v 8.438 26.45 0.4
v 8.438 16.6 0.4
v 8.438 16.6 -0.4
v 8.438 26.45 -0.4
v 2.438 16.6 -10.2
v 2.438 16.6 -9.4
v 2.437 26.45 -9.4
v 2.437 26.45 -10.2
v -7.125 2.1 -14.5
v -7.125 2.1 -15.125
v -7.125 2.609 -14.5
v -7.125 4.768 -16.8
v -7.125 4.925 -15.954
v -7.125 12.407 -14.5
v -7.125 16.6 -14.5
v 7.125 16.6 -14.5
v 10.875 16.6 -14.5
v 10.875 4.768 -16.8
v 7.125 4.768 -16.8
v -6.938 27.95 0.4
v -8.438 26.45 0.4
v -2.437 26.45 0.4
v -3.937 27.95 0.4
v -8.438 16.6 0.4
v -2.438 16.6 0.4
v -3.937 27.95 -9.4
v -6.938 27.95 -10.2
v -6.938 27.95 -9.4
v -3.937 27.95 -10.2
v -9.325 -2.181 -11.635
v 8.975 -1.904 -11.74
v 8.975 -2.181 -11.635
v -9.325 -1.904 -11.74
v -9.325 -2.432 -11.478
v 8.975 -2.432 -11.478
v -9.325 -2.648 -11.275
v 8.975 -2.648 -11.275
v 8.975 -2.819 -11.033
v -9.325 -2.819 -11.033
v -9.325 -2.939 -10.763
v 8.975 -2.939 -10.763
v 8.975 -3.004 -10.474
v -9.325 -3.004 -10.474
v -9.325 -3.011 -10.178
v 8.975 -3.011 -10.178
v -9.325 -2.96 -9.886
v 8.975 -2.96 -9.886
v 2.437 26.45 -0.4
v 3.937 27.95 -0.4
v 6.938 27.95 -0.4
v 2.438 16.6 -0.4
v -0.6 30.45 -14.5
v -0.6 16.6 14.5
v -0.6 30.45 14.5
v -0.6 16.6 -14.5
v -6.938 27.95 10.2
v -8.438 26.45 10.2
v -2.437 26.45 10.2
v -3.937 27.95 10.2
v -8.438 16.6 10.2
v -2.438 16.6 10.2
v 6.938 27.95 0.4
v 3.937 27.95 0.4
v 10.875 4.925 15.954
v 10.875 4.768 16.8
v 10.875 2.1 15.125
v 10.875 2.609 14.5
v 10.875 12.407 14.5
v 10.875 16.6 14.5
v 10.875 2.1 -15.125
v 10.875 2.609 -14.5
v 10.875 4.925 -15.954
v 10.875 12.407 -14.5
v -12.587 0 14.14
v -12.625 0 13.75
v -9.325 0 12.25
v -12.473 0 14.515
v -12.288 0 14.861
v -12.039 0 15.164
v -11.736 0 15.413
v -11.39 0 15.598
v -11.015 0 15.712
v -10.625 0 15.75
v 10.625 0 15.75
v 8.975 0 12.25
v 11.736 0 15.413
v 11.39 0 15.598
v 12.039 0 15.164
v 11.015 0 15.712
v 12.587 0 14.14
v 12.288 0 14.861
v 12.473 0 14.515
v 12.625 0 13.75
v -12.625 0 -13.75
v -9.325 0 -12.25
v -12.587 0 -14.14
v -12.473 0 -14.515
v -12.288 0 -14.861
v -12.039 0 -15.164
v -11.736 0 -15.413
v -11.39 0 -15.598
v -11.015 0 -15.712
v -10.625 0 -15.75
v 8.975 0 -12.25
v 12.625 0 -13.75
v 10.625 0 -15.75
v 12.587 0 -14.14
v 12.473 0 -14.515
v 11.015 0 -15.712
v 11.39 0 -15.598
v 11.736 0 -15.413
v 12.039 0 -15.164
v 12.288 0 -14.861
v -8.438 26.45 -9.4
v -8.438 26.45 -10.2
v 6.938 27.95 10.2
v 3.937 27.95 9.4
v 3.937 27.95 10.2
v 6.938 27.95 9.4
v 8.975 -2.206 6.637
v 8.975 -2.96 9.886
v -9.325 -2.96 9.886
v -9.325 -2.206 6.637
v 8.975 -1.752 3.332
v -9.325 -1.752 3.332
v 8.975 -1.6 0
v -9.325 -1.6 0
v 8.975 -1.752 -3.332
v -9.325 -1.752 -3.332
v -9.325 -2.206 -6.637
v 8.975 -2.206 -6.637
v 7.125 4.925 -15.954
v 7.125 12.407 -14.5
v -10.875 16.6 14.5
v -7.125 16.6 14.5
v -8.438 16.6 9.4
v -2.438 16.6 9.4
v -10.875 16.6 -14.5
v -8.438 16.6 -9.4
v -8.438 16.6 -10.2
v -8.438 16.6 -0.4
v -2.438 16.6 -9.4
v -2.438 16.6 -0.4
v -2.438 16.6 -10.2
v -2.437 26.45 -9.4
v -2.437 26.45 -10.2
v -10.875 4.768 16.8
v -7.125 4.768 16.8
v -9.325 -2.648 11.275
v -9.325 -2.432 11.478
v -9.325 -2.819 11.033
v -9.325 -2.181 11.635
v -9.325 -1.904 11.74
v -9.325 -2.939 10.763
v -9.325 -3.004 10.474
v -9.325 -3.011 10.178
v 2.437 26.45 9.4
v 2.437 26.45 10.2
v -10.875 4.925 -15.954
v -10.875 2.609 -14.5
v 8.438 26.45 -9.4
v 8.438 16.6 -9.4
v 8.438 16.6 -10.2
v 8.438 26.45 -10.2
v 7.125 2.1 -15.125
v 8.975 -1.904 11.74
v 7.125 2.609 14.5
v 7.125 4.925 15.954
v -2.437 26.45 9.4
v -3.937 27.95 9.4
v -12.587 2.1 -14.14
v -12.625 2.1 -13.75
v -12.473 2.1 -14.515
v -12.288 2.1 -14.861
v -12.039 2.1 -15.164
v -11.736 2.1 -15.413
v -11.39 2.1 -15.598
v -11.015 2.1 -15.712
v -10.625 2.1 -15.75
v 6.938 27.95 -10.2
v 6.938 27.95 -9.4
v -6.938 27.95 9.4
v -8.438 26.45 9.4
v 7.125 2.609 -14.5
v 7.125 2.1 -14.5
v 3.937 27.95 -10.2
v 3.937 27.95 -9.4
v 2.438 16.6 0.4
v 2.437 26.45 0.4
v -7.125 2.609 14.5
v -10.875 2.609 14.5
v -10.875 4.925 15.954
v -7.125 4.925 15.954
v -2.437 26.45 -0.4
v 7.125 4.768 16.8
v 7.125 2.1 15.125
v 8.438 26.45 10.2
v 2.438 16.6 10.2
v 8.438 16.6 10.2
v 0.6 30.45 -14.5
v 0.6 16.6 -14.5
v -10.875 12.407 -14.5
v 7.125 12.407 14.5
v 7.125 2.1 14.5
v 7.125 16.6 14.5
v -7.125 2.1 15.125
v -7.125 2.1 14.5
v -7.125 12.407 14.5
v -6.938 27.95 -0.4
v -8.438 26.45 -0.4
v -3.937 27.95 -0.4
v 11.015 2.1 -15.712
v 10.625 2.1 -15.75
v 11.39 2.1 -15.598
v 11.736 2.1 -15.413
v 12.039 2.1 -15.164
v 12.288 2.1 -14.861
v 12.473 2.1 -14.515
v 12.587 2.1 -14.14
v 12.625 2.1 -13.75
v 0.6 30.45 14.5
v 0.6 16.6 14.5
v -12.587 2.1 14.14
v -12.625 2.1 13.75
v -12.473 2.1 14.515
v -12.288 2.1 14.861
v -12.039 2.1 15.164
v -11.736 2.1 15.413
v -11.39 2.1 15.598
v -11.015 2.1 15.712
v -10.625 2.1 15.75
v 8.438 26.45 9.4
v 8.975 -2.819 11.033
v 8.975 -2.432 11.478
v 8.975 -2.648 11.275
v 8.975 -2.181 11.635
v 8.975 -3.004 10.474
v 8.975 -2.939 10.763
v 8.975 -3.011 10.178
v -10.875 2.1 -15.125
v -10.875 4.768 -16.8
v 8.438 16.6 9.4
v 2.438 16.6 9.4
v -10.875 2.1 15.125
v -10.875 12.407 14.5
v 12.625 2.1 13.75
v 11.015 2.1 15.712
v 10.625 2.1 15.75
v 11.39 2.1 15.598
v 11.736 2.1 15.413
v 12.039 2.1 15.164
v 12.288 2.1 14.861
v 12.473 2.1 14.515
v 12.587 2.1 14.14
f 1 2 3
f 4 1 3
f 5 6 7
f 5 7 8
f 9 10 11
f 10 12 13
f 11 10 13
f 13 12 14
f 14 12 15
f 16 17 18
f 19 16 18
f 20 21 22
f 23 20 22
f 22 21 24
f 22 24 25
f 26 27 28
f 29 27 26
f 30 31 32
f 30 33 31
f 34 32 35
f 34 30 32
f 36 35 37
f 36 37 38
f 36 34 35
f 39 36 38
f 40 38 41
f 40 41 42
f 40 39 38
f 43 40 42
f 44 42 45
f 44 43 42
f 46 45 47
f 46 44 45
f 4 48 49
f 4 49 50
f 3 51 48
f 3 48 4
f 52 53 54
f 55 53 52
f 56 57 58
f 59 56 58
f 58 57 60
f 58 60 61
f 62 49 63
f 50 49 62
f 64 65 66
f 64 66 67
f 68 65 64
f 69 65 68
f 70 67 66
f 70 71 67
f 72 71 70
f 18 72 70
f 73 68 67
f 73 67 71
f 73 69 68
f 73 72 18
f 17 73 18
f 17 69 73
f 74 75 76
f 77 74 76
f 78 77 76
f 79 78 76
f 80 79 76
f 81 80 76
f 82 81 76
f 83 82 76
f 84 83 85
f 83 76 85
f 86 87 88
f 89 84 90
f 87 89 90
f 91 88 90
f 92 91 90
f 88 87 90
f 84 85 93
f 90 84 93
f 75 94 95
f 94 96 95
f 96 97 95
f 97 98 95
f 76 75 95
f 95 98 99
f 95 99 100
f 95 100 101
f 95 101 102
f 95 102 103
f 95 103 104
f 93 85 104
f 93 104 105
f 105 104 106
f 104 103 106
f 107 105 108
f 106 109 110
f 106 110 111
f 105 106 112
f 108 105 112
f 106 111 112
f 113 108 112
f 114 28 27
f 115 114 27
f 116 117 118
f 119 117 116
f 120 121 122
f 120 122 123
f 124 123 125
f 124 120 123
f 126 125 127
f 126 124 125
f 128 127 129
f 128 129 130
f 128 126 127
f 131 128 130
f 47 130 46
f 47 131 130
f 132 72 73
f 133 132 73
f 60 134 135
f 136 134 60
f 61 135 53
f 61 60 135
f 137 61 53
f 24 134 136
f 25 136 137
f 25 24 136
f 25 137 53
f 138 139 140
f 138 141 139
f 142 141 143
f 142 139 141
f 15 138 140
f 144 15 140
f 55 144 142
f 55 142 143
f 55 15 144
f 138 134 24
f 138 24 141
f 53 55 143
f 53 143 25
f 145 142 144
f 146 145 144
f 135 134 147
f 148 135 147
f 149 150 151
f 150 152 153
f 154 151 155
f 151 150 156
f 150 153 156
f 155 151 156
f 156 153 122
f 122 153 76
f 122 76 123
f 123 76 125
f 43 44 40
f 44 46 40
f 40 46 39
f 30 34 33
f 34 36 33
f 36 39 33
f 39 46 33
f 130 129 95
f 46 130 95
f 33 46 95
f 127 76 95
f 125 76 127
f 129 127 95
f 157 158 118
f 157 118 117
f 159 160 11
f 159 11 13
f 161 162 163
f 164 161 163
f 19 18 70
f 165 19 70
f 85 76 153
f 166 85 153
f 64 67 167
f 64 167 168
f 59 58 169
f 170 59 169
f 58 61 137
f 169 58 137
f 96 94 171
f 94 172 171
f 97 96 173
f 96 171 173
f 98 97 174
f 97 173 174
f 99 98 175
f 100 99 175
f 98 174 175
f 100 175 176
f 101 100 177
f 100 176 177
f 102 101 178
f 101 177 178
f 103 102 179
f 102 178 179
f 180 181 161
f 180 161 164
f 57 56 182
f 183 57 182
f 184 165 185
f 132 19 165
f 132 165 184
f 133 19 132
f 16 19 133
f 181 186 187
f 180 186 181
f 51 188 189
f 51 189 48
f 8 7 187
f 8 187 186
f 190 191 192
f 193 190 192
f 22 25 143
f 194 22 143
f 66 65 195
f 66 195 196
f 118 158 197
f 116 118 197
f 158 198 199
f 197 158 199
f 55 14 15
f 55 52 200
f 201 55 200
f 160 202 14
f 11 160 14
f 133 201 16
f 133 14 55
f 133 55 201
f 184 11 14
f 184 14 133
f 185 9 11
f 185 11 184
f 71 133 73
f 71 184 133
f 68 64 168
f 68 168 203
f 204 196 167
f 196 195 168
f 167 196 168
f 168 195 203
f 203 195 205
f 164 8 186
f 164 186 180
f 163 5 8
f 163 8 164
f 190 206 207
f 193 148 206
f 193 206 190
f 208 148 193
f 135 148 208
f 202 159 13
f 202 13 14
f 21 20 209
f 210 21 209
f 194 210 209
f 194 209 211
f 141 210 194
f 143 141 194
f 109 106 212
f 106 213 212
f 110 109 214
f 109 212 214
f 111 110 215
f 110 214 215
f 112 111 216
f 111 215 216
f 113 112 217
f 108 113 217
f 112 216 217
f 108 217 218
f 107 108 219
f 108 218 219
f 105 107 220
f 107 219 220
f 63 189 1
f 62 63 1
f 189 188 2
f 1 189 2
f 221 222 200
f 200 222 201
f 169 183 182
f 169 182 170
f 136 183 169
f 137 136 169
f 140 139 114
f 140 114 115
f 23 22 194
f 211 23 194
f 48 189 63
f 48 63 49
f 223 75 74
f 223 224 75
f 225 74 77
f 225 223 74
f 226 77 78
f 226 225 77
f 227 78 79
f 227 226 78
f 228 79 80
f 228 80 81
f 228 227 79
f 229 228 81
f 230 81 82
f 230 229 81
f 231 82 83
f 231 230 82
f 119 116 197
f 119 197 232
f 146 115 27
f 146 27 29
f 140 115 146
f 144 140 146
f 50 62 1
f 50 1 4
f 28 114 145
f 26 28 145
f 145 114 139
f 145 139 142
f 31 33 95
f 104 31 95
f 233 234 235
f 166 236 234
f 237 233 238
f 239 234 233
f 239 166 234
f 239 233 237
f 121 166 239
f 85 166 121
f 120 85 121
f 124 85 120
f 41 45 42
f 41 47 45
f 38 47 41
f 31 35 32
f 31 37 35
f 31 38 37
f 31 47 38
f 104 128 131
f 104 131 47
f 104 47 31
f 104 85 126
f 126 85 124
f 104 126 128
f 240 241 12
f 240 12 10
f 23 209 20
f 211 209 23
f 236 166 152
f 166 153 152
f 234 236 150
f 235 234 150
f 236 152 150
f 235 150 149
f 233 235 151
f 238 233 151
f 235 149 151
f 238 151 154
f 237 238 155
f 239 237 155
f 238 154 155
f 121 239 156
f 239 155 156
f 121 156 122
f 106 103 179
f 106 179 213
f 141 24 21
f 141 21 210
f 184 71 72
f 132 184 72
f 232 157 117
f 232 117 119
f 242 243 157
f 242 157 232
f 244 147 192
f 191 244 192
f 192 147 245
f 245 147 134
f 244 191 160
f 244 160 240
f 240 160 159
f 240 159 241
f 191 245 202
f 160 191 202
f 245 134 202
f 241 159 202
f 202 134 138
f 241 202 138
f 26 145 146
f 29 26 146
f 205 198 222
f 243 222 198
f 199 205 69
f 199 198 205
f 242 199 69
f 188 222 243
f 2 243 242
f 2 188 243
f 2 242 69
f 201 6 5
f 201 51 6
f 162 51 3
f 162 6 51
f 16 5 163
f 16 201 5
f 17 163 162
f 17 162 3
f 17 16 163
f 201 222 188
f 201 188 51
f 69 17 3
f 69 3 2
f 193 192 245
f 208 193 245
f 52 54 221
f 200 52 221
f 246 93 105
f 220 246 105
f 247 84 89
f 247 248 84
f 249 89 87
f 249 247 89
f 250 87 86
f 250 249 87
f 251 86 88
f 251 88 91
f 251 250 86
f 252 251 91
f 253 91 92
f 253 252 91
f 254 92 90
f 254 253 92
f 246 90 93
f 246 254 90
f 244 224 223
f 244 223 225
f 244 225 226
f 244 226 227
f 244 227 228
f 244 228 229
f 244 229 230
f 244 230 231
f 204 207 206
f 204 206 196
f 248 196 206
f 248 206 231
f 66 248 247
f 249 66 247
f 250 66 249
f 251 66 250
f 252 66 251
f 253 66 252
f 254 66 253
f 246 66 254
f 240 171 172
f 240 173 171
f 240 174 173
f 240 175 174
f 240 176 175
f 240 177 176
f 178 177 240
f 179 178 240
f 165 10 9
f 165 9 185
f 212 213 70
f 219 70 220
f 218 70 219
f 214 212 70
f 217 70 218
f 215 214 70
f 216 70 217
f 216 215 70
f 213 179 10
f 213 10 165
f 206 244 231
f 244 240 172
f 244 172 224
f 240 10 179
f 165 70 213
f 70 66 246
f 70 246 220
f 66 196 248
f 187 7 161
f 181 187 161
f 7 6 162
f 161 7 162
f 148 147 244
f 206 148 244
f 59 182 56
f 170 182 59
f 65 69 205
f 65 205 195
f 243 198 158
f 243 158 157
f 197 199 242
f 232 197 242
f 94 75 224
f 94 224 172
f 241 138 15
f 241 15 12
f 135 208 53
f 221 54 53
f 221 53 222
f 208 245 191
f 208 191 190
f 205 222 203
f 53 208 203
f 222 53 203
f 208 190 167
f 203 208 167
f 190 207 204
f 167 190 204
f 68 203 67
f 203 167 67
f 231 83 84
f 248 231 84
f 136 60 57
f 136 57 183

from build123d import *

# Parameters (mm, degrees)
SKETCH1_W            = 21.75
SKETCH1_H            = 29
BOSS_EXTRUDE1_DEPTH  = 16.6
SKETCH2_W            = 25.25
SKETCH2_H            = 31.5
BOSS_EXTRUDE2_DEPTH  = 2.1
SKETCH3_W            = 1.2
SKETCH3_H            = 29
BOSS_EXTRUDE3_DEPTH  = 13.85
BOSS_EXTRUDE4_START  = -3.65
BOSS_EXTRUDE4_DEPTH  = 18.3
SKETCH5_W            = 6
SKETCH5_H            = 0.8
BOSS_EXTRUDE6_DEPTH  = 11.35
CHAMFER2_SIZE        = 1.5
FILLET1_R            = 2
FILLET2_R            = 1.5
BOSS_EXTRUDE7_DEPTH  = 3.75
MIRROR2_COPY_1_DEPTH = 3.75


with BuildPart() as part:
    # Sketch1 → Boss-Extrude1 (new body)
    with BuildSketch(Plane(origin=(0, 0, 0), x_dir=(1, 0, 0), z_dir=(0, 1, 0))):
        Rectangle(SKETCH1_W, SKETCH1_H)
    extrude(amount=BOSS_EXTRUDE1_DEPTH)

    # Sketch2 → Boss-Extrude2 (add)
    with BuildSketch(Plane(origin=(0, 0, 0), x_dir=(1, 0, 0), z_dir=(0, 1, 0))):
        Rectangle(SKETCH2_W, SKETCH2_H)
    extrude(amount=BOSS_EXTRUDE2_DEPTH)

    # Sketch3 → Boss-Extrude3 (add)
    with BuildSketch(Plane(origin=(0, 16.6, 0), x_dir=(1, 0, 0), z_dir=(0, 1, 0))):
        Rectangle(SKETCH3_W, SKETCH3_H)
    extrude(amount=BOSS_EXTRUDE3_DEPTH)

    # Sketch4 → Boss-Extrude4 (add)
    with BuildSketch(Plane(origin=(12.625, 0, 0), x_dir=(0, 0, -1), z_dir=(1, 0, 0)).offset(BOSS_EXTRUDE4_START)):
        with BuildLine():
            Line((-12.25, 0), (-11.338972746, -3.4))
            ThreePointArc((-11.338972746, -3.4), (0, -1.6), (11.338972746, -3.4))
            Line((11.338972746, -3.4), (12.25, 0))
            Line((12.25, 0), (-12.25, 0))
        make_face()
    extrude(amount=-BOSS_EXTRUDE4_DEPTH)

    # Sketch5 → Boss-Extrude6 (add)
    with BuildSketch(Plane(origin=(0, 16.6, 0), x_dir=(1, 0, 0), z_dir=(0, 1, 0))):
        with Locations((5.4375, 9.8)):
            Rectangle(SKETCH5_W, SKETCH5_H)
        with Locations((5.4375, 0)):
            Rectangle(SKETCH5_W, SKETCH5_H)
        with Locations((5.4375, -9.8)):
            Rectangle(SKETCH5_W, SKETCH5_H)
        with Locations((-5.4375, -9.8)):
            Rectangle(SKETCH5_W, SKETCH5_H)
        with Locations((-5.4375, 0)):
            Rectangle(SKETCH5_W, SKETCH5_H)
        with Locations((-5.4375, 9.8)):
            Rectangle(SKETCH5_W, SKETCH5_H)
    extrude(amount=BOSS_EXTRUDE6_DEPTH)

    # Chamfer2
    chamfer2_edges = [part.edges().sort_by_distance(p)[0] for p in [
        (-2.4375, 27.95, 0),
        (-8.4375, 27.95, 0),
        (-2.4375, 27.95, -9.8),
        (-8.4375, 27.95, -9.8),
        (8.4375, 27.95, 0),
        (2.4375, 27.95, 0),
        (-2.4375, 27.95, 9.8),
        (-8.4375, 27.95, 9.8),
        (2.4375, 27.95, -9.8),
        (8.4375, 27.95, -9.8),
        (2.4375, 27.95, 9.8),
        (8.4375, 27.95, 9.8),
    ]]
    chamfer(chamfer2_edges, length=CHAMFER2_SIZE)

    # Fillet1
    fillet1_edges = [part.edges().sort_by_distance(p)[0] for p in [
        (12.625, 1.05, 15.75),
        (12.625, 1.05, -15.75),
        (-12.625, 1.05, -15.75),
        (-12.625, 1.05, 15.75),
    ]]
    fillet(fillet1_edges, radius=FILLET1_R)

    # Fillet2
    fillet2_edges = [part.edges().sort_by_distance(p)[0] for p in [
        (-0.175, -3.4, -11.338972746),
        (-0.175, -3.4, 11.338972746),
    ]]
    fillet(fillet2_edges, radius=FILLET2_R)

    # Sketch6 → Boss-Extrude7 (add)
    with BuildSketch(Plane.ZY.offset(10.875)):
        Polygon((-14.5, 16.6), (-16.8, 4.767525763), (-15.125, 2.1), (-14.5, 2.1), (-14.5, 2.609042619), (-15.954375498, 4.925212238), (-14.5, 12.407325549), align=None)
    boss_extrude7 = extrude(amount=-BOSS_EXTRUDE7_DEPTH)

    # Mirror1: Boss-Extrude7 across plane
    add(boss_extrude7.mirror(Plane(origin=(0, 0, 0), x_dir=(0, 0, 1), z_dir=(1, 0, 0))))

    # Mirror2: Boss-Extrude7 across plane
    add(boss_extrude7.mirror(Plane.XY))

    # Mirror2 copy 1 sketch → Mirror2 copy 1 (add)
    with BuildSketch(Plane(origin=(10.875, 0, 0), x_dir=(0, 0, -1), z_dir=(1, 0, 0))):
        Polygon((-14.5, 16.6), (-16.8, 4.767525763), (-15.125, 2.1), (-14.5, 2.1), (-14.5, 2.609042619), (-15.954375498, 4.925212238), (-14.5, 12.407325549), align=None)
    extrude(amount=-MIRROR2_COPY_1_DEPTH)


solid = part.part
